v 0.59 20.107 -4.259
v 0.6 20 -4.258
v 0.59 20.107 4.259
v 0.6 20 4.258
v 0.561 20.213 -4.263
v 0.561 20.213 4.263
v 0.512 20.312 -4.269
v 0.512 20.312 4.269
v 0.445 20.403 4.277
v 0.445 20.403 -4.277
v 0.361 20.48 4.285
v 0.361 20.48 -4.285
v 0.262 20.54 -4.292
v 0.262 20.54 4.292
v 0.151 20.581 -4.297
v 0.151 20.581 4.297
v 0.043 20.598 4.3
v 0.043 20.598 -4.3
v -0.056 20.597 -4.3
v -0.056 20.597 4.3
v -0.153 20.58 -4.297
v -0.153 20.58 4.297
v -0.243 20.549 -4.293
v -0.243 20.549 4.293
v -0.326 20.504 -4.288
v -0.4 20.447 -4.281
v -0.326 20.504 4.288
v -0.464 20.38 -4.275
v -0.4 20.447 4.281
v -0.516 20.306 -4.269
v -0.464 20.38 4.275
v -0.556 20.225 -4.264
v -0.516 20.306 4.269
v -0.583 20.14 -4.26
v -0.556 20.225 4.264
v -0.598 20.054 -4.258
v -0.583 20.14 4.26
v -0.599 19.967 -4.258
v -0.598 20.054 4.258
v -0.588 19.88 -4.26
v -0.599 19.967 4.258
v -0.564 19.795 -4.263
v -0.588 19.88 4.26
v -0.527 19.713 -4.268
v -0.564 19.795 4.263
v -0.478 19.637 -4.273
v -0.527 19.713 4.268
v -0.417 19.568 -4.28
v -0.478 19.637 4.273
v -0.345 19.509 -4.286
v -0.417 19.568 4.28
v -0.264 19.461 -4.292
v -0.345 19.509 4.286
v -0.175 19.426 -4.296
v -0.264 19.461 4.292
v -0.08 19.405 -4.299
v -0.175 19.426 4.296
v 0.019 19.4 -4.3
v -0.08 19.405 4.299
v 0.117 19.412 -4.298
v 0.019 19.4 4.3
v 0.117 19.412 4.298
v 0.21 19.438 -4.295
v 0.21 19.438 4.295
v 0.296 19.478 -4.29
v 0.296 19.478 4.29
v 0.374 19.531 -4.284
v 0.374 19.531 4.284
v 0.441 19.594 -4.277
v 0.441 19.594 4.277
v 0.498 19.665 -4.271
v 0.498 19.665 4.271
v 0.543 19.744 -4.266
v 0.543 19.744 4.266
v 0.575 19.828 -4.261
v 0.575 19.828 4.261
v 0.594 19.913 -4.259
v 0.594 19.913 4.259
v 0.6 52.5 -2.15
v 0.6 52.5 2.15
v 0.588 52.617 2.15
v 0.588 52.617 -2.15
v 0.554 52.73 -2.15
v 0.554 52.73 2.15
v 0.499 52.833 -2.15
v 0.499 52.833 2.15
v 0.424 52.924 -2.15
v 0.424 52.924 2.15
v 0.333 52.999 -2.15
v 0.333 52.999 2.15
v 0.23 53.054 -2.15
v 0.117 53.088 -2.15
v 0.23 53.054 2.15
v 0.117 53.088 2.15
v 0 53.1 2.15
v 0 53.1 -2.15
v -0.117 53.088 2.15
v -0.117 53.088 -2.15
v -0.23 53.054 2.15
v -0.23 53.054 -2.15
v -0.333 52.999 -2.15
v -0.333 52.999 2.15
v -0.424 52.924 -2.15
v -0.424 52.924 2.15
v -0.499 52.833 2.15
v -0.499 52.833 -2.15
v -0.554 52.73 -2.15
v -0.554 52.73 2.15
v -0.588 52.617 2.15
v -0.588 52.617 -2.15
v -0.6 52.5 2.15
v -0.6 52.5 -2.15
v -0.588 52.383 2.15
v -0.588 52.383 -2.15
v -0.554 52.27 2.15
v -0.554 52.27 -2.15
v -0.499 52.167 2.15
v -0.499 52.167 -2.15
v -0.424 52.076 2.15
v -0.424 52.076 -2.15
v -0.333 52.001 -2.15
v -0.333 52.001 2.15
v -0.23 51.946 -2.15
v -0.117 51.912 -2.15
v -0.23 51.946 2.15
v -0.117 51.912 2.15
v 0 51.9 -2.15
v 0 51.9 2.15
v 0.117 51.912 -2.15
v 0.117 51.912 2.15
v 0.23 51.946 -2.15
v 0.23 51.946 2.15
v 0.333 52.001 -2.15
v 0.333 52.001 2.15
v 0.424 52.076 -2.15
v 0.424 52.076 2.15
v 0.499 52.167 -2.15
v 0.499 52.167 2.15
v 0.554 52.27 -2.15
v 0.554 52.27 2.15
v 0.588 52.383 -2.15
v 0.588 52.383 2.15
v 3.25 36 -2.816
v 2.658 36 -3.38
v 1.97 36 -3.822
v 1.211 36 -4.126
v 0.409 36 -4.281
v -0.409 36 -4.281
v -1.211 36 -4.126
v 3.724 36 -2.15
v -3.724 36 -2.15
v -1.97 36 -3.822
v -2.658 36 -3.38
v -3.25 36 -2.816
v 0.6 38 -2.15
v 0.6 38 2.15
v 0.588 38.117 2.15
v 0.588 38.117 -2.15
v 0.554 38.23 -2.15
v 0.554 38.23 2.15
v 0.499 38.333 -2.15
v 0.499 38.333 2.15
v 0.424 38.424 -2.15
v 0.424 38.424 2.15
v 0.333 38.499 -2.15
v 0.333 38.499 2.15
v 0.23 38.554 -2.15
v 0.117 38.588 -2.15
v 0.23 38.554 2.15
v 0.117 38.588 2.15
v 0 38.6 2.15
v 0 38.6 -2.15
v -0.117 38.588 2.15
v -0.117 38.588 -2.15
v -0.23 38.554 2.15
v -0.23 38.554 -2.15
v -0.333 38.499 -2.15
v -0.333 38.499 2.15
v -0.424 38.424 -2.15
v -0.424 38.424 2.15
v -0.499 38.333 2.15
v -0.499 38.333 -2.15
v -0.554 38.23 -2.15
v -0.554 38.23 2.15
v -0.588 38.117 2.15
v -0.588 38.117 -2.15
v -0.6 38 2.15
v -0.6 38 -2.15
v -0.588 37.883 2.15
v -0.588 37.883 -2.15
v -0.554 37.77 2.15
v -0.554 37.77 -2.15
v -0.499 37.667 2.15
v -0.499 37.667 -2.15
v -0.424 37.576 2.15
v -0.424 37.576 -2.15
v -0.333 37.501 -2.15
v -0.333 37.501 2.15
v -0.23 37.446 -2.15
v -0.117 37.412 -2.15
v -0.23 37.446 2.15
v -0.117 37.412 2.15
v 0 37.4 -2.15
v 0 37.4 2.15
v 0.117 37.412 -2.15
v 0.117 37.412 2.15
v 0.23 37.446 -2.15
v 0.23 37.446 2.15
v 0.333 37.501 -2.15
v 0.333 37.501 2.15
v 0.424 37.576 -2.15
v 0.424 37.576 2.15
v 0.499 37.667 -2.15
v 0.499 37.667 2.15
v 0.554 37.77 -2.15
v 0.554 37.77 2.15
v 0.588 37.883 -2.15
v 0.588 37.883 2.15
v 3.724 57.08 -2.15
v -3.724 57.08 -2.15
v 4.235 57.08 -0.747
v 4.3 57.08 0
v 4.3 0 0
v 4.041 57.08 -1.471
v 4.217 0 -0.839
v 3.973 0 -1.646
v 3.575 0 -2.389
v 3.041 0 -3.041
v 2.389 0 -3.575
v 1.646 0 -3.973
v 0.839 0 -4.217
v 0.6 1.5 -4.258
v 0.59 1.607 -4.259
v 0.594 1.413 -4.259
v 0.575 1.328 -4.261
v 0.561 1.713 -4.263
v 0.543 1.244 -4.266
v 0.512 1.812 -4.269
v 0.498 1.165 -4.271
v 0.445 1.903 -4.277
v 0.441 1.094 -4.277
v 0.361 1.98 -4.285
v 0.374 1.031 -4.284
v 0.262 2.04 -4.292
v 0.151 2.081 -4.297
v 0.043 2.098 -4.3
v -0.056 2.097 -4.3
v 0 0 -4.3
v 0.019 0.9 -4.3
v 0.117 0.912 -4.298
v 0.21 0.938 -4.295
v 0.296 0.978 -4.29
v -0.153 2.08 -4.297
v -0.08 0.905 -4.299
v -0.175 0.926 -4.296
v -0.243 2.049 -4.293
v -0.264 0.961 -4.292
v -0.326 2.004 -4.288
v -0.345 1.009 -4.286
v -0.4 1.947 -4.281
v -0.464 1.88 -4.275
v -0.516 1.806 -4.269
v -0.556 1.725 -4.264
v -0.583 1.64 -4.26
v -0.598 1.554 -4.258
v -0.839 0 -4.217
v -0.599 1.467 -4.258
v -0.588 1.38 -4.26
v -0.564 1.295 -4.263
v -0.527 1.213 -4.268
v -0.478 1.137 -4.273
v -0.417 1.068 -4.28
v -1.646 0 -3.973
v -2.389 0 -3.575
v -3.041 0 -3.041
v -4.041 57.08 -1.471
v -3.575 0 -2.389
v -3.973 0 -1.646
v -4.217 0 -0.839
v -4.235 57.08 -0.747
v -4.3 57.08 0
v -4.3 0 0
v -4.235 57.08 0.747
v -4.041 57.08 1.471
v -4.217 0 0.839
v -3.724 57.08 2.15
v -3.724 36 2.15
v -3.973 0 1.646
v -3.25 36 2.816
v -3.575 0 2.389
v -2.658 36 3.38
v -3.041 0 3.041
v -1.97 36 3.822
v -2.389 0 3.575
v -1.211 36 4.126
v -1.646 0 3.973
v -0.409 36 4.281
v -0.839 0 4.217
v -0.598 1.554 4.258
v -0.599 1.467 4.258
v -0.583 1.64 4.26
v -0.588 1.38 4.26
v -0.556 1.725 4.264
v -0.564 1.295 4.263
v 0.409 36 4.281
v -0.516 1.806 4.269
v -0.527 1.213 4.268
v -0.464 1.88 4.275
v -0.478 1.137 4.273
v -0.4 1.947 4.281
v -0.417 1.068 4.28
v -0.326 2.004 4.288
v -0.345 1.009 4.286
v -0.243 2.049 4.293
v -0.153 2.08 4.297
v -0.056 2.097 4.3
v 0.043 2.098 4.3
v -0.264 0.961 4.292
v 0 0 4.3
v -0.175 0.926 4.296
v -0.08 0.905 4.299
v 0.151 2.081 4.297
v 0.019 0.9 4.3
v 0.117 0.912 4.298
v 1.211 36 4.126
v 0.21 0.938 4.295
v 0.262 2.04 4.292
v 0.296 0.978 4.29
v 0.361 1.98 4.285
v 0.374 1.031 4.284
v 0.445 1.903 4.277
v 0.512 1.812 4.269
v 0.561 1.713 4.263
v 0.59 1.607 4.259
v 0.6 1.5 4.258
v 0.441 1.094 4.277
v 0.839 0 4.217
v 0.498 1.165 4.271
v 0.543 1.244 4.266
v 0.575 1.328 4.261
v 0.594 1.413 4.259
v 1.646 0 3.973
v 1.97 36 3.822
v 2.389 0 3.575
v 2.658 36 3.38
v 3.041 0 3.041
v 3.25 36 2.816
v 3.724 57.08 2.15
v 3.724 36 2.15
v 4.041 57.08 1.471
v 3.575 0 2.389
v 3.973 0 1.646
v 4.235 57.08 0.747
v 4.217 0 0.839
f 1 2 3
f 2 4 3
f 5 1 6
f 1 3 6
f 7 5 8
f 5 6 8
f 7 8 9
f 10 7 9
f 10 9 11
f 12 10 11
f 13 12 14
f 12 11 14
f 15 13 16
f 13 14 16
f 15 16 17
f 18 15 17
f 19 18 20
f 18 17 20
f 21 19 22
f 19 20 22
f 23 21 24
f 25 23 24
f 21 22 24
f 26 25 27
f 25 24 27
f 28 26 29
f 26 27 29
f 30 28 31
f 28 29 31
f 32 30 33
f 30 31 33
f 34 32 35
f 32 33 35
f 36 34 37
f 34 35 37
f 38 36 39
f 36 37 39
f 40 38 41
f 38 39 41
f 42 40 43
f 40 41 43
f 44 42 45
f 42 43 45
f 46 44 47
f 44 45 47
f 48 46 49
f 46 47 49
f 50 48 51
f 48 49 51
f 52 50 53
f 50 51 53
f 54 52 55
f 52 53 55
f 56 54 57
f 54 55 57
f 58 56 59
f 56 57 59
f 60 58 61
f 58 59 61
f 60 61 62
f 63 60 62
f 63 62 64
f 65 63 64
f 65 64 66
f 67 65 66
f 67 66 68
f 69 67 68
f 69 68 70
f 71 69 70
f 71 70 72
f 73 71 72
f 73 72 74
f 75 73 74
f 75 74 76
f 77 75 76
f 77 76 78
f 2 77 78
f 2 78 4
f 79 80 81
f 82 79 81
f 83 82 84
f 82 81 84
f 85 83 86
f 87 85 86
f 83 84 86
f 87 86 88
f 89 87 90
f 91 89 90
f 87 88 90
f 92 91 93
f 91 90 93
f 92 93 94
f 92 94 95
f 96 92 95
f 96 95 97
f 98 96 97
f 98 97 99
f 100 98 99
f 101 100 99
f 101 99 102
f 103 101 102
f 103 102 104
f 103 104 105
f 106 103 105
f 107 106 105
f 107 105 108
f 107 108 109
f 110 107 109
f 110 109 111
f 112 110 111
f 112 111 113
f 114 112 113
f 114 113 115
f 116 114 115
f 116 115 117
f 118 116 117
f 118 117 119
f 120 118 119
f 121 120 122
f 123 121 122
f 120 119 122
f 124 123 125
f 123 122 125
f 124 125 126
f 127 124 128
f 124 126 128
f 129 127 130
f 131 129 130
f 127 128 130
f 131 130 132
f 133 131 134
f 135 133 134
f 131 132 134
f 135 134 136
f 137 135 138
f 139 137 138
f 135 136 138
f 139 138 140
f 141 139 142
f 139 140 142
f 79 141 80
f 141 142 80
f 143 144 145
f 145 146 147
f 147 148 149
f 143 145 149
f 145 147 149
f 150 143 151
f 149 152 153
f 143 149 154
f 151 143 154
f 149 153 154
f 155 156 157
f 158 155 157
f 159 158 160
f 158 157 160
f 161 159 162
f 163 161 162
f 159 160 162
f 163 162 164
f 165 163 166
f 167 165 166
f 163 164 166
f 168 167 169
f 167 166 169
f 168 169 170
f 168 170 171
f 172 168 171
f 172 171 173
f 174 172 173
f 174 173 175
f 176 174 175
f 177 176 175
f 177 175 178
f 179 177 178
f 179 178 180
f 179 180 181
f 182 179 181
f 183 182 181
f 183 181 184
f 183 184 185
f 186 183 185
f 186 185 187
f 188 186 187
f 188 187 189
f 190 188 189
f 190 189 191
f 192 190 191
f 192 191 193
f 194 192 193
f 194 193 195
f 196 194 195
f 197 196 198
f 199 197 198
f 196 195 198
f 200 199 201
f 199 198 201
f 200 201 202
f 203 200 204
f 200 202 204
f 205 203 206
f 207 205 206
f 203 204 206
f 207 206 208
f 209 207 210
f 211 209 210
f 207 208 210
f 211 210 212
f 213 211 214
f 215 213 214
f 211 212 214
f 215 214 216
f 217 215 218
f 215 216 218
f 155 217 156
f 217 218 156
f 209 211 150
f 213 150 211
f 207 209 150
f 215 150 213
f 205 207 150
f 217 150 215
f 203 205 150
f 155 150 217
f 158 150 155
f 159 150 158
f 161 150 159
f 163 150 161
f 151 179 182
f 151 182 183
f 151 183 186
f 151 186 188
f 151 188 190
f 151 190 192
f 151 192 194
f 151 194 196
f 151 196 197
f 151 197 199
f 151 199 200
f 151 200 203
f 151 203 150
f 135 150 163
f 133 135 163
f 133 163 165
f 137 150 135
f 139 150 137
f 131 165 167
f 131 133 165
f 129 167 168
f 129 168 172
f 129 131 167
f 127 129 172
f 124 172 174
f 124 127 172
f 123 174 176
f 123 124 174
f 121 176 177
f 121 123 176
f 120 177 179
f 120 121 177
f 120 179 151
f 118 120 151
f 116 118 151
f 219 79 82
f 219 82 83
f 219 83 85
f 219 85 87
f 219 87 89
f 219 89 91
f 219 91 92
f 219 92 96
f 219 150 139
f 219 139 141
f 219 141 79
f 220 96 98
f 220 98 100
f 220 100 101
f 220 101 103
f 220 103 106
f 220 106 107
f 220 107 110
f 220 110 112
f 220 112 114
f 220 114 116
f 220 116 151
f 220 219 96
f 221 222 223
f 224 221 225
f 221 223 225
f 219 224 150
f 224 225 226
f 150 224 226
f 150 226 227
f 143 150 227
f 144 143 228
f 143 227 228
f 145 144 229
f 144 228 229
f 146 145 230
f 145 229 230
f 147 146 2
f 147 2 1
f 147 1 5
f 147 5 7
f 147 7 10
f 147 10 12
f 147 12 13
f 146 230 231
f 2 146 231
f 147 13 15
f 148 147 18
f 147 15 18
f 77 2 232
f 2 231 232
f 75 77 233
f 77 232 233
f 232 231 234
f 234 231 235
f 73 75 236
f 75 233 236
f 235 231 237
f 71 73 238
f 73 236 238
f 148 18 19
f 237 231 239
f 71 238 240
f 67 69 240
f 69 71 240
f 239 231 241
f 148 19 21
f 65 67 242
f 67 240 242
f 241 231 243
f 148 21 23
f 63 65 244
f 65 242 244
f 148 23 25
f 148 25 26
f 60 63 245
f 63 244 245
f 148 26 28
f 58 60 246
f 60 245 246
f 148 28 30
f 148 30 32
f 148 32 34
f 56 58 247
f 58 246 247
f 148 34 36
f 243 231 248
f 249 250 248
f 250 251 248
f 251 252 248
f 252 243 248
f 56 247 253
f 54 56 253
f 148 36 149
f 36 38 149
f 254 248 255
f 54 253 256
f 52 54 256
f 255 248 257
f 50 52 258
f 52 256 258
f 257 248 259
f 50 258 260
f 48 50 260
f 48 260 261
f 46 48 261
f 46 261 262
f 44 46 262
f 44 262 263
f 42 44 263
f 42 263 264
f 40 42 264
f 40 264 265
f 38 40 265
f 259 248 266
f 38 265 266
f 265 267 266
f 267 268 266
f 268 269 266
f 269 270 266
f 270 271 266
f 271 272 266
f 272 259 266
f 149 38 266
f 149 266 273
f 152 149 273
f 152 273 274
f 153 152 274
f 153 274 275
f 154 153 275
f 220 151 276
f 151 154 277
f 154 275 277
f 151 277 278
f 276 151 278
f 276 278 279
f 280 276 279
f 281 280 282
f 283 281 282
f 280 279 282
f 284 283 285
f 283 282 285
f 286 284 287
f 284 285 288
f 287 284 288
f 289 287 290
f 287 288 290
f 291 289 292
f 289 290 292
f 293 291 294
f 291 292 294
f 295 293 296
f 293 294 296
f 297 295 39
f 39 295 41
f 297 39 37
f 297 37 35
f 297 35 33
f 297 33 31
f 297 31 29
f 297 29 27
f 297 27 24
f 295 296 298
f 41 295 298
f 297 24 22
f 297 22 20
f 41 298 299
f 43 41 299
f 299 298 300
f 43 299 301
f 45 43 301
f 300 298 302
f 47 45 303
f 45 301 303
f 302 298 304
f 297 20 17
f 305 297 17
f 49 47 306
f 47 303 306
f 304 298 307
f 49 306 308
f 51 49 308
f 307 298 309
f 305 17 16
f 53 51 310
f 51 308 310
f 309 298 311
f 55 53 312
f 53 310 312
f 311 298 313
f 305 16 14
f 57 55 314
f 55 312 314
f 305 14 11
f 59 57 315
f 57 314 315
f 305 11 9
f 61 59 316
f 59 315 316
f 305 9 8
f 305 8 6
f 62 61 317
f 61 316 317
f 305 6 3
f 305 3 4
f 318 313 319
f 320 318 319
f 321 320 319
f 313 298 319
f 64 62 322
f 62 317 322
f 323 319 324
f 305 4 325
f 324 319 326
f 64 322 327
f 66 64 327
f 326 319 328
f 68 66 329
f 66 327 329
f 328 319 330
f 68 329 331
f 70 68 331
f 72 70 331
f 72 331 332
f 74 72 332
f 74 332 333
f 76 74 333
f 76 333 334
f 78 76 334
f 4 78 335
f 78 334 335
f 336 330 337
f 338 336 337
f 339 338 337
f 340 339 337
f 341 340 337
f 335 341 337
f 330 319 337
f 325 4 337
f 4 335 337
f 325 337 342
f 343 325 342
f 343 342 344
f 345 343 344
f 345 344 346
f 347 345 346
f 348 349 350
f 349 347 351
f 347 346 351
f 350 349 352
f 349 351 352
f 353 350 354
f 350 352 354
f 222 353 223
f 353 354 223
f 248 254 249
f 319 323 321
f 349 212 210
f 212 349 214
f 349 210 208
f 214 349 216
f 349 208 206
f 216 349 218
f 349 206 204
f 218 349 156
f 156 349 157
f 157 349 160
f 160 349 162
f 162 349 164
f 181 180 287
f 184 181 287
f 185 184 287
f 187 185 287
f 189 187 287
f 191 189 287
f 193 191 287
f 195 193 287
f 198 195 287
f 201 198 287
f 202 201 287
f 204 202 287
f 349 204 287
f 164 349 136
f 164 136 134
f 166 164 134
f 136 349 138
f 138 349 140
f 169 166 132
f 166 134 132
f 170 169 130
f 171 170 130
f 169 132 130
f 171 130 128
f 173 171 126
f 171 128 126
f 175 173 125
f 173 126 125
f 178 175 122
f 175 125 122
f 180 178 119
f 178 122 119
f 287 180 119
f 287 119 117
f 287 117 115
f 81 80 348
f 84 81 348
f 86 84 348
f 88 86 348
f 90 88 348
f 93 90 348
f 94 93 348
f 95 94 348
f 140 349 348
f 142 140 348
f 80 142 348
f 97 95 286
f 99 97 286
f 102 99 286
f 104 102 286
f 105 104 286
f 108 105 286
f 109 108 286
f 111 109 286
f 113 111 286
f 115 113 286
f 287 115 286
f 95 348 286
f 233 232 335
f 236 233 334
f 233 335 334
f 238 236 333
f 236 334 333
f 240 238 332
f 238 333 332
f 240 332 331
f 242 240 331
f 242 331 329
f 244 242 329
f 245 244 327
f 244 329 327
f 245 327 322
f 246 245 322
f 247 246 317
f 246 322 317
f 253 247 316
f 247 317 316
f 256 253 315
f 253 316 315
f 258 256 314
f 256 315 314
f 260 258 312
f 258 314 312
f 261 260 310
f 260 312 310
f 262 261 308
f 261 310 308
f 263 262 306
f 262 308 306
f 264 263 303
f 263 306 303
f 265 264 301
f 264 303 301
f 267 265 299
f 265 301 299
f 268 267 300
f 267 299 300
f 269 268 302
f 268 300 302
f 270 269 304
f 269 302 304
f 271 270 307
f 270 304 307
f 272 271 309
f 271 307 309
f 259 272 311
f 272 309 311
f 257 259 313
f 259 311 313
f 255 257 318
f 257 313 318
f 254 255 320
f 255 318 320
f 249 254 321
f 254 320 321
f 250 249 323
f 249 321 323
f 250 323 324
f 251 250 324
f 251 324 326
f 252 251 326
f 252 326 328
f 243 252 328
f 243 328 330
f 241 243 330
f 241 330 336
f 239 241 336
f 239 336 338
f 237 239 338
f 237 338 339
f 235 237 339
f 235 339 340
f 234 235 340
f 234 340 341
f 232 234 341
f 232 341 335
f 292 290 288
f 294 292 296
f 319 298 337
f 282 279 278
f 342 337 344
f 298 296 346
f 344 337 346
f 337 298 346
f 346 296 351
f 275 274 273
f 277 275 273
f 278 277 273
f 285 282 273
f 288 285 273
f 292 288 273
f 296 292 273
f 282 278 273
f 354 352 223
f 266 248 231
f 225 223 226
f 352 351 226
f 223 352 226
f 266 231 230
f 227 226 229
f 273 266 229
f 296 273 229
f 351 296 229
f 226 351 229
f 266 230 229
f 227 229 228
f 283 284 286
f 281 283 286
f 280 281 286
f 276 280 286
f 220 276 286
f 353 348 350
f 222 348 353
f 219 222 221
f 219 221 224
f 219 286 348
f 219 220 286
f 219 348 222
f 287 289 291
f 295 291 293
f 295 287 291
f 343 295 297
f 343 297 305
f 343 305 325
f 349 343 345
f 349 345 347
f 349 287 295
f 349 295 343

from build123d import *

# Parameters (mm, degrees)
SKETCH2_R               = 4.3
BOSS_EXTRUDE2_DEPTH     = 57.08
CUT_EXTRUDE2_DEPTH      = 21.08
SKETCH6_R               = 0.6
CUT_EXTRUDE3_DEPTH      = 5.3
CUT_EXTRUDE3_DEPTH_BACK = 5.3
SKETCH7_R               = 0.6
CUT_EXTRUDE4_DEPTH      = 10
SKETCH8_R               = 0.6
CUT_EXTRUDE5_DEPTH      = 5.3000001
CUT_EXTRUDE5_DEPTH_BACK = 5.3000001
SKETCH9_R               = 0.6
CUT_EXTRUDE6_DEPTH      = 7.4500001


with BuildPart() as part:
    # Sketch2 → Boss-Extrude2 (new body)
    with BuildSketch(Plane(origin=(0, 0, 0), x_dir=(1, 0, 0), z_dir=(0, 1, 0))):
        Circle(SKETCH2_R)
    extrude(amount=BOSS_EXTRUDE2_DEPTH)

    # Sketch4 → Cut-Extrude2 (cut)
    with BuildSketch(Plane(origin=(0, 57.08, 0), x_dir=(1, 0, 0), z_dir=(0, 1, 0))):
        with BuildLine():
            Line((0, 2.15), (-3.723909236, 2.15))
            ThreePointArc((-3.723909236, 2.15), (0, 4.3), (3.723909236, 2.15))
            Line((3.723909236, 2.15), (0, 2.15))
        make_face()
        with BuildLine():
            Line((0, -2.15), (-3.723909236, -2.15))
            ThreePointArc((-3.723909236, -2.15), (0, -4.3), (3.723909236, -2.15))
            Line((3.723909236, -2.15), (0, -2.15))
        make_face()
    extrude(amount=-CUT_EXTRUDE2_DEPTH, mode=Mode.SUBTRACT)

    # Sketch6 → Cut-Extrude3 (cut, two sides)
    with BuildSketch(Plane.XY) as cut_extrude3_sk:
        with Locations((0, 1.5)):
            Circle(SKETCH6_R)
    extrude(amount=CUT_EXTRUDE3_DEPTH, mode=Mode.SUBTRACT)
    extrude(cut_extrude3_sk.sketch, amount=-CUT_EXTRUDE3_DEPTH_BACK, mode=Mode.SUBTRACT)

    # Sketch7 → Cut-Extrude4 (cut)
    with BuildSketch(Plane.XY.offset(2.15)):
        with Locations((0, 38)):
            Circle(SKETCH7_R)
    extrude(amount=-CUT_EXTRUDE4_DEPTH, mode=Mode.SUBTRACT)

    # Sketch8 → Cut-Extrude5 (cut, two sides)
    with BuildSketch(Plane.XY) as cut_extrude5_sk:
        with Locations((0, 20)):
            Circle(SKETCH8_R)
    extrude(amount=CUT_EXTRUDE5_DEPTH, mode=Mode.SUBTRACT)
    extrude(cut_extrude5_sk.sketch, amount=-CUT_EXTRUDE5_DEPTH_BACK, mode=Mode.SUBTRACT)

    # Sketch9 → Cut-Extrude6 (cut, through all)
    with BuildSketch(Plane.XY.offset(2.15)):
        with Locations((0, 52.5)):
            Circle(SKETCH9_R)
    extrude(amount=-CUT_EXTRUDE6_DEPTH, mode=Mode.SUBTRACT)


solid = part.part
